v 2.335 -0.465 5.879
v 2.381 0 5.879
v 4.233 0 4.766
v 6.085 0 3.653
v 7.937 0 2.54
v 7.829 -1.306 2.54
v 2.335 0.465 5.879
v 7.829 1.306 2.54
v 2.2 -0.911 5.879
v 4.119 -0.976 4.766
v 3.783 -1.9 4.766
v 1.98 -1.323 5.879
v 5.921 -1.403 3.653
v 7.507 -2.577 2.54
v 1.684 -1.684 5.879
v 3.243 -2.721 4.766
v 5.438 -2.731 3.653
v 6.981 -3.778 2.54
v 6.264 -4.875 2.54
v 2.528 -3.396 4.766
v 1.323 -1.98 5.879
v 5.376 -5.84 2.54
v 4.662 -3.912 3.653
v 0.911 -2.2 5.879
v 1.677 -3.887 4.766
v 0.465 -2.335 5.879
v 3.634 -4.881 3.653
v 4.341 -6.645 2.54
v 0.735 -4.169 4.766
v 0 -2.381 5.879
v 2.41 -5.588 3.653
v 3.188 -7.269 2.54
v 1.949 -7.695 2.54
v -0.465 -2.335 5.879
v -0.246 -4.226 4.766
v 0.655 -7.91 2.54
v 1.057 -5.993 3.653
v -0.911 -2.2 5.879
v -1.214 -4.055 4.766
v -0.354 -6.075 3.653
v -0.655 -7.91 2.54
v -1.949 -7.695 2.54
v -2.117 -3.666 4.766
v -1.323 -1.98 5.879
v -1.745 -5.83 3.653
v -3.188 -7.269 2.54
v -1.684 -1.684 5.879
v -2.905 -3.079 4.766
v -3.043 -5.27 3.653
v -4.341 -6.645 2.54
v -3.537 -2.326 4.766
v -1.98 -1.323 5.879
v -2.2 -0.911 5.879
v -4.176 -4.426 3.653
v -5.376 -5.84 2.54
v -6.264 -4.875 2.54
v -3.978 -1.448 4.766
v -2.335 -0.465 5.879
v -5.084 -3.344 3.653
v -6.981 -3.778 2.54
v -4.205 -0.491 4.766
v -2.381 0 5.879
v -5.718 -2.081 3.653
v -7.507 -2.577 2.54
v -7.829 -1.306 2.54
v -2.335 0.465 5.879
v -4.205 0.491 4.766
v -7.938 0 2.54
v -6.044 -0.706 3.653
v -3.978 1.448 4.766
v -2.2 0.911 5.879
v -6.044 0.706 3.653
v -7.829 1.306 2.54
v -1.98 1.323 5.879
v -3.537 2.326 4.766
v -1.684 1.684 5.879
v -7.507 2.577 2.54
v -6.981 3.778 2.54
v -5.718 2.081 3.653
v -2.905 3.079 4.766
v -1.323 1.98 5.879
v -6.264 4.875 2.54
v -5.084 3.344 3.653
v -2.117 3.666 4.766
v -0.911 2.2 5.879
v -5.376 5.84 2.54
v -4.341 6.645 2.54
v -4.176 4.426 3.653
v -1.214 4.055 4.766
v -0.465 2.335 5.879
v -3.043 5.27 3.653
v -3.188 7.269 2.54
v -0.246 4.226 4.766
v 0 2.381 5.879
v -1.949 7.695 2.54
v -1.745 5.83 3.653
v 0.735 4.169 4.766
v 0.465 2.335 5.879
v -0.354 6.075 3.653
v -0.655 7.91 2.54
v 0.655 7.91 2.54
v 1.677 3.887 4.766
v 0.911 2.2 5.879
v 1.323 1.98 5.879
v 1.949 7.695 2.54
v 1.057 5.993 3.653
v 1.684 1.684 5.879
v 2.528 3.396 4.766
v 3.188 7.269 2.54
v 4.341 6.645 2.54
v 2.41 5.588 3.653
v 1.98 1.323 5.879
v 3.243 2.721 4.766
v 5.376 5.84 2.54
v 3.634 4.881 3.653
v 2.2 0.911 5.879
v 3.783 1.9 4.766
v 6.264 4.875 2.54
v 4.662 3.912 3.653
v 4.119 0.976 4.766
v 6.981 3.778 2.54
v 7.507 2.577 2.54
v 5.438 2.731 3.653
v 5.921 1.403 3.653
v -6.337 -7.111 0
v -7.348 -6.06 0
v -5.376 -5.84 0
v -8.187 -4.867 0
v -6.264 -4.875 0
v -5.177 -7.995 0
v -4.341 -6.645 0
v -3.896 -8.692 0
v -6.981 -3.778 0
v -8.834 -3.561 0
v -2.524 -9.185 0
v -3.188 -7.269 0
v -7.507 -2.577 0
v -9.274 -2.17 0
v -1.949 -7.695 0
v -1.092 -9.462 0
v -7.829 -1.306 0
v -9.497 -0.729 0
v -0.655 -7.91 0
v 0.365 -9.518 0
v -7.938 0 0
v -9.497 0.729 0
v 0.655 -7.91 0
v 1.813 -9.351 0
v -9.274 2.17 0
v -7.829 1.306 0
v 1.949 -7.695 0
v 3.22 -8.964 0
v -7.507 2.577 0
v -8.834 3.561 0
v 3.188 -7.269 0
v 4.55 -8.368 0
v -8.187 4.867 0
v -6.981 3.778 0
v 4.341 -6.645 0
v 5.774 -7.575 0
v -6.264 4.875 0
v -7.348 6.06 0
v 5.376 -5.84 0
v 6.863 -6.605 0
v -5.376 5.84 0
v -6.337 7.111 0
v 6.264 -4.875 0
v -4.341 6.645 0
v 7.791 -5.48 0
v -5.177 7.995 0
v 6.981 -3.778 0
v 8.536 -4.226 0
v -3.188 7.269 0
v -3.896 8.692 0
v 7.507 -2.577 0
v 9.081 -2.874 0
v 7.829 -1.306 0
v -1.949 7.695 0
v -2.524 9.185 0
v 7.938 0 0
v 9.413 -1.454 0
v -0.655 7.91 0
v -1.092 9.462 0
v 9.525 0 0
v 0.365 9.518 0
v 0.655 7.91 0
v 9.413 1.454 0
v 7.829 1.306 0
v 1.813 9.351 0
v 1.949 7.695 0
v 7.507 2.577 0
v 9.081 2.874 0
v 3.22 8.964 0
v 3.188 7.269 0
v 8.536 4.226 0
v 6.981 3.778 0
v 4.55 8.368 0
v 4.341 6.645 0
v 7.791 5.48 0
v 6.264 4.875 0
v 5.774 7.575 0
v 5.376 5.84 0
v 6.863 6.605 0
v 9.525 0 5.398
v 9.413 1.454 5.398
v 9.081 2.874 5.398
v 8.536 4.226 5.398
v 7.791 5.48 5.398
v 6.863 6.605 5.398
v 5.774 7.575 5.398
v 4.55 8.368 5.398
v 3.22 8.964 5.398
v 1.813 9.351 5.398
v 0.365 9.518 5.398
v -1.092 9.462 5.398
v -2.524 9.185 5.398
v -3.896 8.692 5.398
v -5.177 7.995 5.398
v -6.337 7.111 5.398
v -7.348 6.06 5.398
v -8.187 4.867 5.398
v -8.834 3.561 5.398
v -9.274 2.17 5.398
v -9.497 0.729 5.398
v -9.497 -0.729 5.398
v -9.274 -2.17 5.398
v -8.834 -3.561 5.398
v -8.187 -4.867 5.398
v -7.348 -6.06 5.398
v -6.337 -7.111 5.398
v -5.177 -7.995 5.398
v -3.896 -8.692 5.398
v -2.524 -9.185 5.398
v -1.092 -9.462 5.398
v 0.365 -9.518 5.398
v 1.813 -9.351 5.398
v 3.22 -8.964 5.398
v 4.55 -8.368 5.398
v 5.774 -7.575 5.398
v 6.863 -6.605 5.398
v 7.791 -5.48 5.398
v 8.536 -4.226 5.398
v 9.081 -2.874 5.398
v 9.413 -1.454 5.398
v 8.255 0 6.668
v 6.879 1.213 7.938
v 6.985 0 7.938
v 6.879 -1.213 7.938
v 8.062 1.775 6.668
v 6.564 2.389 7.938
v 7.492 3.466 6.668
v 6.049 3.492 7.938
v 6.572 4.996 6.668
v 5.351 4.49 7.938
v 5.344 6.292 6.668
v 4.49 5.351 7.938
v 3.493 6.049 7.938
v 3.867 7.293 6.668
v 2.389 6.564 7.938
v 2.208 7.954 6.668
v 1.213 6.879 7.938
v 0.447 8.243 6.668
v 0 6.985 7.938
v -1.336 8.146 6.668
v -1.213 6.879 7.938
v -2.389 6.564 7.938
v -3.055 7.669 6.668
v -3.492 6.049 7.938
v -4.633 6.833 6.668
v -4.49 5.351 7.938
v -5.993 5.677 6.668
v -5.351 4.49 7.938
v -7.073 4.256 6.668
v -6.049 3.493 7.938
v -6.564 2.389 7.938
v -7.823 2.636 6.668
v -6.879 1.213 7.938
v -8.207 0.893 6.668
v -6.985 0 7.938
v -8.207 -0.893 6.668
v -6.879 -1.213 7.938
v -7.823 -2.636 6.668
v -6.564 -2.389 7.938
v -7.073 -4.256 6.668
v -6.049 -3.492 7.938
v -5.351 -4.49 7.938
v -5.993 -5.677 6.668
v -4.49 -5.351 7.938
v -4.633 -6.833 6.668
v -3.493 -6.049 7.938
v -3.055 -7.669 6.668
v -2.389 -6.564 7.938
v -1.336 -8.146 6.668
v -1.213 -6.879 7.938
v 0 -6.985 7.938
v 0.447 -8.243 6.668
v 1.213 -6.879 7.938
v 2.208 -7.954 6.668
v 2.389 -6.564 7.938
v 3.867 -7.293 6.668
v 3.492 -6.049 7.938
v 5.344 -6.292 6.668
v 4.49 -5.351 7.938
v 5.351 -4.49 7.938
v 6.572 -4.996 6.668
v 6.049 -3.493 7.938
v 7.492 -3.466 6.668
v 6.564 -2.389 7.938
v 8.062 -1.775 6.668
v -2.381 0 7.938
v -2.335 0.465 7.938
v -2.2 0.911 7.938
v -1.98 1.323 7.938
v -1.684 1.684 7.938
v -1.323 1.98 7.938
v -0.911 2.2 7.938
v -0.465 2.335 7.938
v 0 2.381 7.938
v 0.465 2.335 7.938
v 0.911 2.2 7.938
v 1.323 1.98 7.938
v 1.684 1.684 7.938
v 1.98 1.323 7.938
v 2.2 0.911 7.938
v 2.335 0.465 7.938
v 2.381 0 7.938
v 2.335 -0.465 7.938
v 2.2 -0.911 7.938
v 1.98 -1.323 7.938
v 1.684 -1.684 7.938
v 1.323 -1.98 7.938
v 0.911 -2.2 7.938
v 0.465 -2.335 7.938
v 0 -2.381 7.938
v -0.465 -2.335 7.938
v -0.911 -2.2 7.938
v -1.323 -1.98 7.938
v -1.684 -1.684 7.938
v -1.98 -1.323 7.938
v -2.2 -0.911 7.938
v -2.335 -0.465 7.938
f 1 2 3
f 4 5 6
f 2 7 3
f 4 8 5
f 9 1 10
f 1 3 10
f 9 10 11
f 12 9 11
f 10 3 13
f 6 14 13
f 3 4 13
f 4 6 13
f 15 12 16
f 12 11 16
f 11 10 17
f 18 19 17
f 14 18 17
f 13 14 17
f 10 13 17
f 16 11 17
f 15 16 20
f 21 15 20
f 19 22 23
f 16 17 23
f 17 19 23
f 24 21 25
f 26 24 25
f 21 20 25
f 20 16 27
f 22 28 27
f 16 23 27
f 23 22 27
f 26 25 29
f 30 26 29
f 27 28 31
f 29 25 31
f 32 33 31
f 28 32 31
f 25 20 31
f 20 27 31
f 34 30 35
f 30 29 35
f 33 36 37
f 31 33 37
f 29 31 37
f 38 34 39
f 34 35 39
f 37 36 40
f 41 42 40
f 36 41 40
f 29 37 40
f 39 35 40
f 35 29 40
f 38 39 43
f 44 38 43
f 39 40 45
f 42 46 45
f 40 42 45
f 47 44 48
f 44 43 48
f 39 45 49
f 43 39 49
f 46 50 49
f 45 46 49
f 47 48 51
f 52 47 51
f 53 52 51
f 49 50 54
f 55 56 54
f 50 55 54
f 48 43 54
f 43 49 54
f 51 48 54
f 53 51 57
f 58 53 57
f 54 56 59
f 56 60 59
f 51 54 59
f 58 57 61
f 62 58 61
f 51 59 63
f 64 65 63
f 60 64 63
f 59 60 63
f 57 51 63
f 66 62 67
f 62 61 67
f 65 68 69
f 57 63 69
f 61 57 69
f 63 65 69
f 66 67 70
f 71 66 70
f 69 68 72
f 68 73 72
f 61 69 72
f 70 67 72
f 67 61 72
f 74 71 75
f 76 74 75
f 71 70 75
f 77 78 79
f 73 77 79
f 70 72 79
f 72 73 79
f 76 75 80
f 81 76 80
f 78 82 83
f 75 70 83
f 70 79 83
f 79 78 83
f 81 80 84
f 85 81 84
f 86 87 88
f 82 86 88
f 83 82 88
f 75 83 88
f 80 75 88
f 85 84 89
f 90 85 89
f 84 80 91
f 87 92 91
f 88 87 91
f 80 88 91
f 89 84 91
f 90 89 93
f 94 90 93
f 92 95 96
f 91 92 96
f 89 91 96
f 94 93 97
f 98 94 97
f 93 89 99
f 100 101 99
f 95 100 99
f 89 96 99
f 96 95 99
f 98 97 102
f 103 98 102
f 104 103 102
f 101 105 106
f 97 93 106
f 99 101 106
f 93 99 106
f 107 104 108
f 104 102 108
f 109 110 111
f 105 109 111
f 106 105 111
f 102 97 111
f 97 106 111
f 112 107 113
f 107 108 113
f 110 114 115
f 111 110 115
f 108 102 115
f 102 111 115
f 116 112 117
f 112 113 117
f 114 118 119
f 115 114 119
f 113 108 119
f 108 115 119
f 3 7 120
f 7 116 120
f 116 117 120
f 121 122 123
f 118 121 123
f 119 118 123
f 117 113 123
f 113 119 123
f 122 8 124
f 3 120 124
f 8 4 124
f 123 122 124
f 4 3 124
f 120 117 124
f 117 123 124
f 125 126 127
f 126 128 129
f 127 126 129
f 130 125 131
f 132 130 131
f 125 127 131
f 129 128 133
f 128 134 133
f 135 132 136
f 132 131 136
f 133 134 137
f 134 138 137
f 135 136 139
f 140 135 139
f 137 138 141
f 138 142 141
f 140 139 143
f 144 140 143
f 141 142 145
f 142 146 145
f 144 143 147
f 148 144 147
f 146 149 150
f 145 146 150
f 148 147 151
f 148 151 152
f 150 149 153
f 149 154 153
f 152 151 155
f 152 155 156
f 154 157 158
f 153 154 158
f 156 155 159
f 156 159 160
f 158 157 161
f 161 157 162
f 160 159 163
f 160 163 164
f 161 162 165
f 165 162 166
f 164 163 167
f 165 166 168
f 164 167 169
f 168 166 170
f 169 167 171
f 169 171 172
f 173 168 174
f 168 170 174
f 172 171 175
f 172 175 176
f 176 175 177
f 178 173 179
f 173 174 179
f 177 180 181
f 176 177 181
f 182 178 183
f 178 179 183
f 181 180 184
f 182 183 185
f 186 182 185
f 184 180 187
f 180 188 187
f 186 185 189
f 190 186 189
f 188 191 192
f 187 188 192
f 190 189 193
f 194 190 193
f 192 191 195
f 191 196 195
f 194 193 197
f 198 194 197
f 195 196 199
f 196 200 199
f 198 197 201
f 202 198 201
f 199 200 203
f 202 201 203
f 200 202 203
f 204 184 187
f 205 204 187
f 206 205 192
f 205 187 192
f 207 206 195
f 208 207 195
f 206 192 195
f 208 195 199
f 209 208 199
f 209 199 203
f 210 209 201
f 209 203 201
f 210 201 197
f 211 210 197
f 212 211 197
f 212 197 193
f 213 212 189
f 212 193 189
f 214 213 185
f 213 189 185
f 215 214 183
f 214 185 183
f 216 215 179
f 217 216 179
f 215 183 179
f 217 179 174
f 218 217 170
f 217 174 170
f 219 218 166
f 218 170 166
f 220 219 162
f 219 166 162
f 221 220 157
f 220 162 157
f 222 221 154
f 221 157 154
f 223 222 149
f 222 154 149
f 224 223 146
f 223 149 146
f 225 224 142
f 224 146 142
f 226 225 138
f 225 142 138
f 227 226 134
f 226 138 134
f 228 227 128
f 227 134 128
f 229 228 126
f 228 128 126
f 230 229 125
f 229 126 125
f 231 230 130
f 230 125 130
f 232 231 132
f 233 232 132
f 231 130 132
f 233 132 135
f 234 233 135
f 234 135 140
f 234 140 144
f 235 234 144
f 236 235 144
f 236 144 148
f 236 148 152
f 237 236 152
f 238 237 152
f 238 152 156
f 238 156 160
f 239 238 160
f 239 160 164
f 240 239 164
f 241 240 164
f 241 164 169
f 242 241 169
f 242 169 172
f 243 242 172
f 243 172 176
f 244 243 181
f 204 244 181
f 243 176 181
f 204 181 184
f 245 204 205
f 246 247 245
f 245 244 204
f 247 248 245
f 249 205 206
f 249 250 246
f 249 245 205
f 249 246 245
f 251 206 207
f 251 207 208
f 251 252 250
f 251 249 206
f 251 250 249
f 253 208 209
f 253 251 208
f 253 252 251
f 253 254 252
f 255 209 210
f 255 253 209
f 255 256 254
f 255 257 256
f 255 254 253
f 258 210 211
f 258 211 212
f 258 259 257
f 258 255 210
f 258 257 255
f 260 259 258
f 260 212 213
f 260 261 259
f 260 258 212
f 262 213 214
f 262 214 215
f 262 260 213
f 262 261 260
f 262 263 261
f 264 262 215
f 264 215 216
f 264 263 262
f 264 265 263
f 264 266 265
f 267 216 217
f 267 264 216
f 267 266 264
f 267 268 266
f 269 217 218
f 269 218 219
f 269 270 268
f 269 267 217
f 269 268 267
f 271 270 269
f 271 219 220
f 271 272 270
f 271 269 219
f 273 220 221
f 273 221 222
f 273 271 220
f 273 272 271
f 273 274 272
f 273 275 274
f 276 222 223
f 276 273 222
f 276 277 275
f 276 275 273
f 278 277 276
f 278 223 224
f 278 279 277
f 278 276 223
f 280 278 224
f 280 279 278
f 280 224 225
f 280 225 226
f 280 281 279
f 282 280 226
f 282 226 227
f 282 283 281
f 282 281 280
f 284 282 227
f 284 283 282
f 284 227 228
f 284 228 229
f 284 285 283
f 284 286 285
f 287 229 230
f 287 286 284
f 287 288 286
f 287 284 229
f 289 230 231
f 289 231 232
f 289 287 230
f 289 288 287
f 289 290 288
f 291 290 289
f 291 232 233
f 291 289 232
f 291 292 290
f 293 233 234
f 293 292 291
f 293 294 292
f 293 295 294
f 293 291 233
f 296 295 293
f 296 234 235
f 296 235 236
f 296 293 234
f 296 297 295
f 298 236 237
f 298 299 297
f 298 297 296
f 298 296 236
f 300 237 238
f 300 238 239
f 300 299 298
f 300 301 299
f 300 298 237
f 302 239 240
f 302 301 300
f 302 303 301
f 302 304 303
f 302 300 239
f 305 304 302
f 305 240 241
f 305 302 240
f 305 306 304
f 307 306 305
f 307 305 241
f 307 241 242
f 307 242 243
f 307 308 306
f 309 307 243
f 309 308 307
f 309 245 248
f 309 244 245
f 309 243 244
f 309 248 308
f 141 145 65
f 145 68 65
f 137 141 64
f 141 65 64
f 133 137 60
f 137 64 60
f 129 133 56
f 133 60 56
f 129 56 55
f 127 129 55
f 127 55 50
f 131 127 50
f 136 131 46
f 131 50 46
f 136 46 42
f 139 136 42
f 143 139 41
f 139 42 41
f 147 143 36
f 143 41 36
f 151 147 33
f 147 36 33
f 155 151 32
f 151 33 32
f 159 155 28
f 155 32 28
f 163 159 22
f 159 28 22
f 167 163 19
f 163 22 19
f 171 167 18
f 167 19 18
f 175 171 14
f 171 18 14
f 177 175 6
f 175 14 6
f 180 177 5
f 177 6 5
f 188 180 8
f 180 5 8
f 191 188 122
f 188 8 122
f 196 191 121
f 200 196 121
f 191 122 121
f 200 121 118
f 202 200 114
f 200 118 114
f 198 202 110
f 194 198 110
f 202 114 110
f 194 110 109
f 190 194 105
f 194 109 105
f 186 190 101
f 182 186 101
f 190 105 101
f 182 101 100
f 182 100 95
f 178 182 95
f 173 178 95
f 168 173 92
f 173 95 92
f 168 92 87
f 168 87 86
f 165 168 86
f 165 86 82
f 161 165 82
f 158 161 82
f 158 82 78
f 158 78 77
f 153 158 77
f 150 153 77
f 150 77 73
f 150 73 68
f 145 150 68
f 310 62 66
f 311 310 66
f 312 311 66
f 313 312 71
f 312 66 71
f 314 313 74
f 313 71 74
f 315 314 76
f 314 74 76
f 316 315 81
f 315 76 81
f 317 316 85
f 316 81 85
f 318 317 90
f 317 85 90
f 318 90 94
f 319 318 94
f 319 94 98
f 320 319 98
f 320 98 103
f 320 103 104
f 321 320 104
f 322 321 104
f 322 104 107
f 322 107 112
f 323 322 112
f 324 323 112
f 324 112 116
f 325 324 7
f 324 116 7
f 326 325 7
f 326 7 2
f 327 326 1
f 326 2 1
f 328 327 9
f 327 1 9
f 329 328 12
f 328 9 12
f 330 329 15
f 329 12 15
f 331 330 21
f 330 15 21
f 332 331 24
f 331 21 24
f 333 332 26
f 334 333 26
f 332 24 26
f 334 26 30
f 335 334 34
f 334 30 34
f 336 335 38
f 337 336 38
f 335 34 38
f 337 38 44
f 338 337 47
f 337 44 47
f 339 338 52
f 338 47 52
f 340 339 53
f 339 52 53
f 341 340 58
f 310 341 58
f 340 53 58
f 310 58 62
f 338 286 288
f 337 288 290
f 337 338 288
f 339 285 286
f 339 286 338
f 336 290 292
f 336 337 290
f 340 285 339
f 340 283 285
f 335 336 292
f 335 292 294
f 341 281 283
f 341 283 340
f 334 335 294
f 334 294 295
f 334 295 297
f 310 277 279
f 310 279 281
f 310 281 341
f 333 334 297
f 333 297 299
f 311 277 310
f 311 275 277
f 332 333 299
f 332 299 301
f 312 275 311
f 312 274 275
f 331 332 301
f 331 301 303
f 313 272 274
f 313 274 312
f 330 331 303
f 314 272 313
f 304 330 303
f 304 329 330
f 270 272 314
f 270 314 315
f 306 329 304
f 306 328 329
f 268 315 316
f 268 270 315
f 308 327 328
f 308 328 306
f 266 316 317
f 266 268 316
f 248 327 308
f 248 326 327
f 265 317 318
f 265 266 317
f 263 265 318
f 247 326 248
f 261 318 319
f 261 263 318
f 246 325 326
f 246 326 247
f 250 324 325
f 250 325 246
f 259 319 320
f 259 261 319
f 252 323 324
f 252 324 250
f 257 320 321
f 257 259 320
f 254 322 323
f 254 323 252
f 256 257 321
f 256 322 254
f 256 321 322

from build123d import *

# Parameters (mm, degrees)
F0_R     = 9.525
F1_DEPTH = 7.9375
F2_SIZE2 = 2.54
F2_SIZE  = 2.54
F4_D     = 4.7625
F6_D     = 15.875
F6_DEPTH = 2.54
F6_TIP   = 4.7693311635


with BuildPart() as f1:
    # F0 (on Top) → F1 (new body)
    with BuildSketch(Plane.XY):
        Circle(F0_R)
    extrude(amount=F1_DEPTH)

    # F2
    f2_edges = [f1.edges().sort_by_distance(p)[0] for p in [
        (-9.525, 0, 7.9375),
    ]]
    chamfer(f2_edges, length=F2_SIZE, length2=F2_SIZE2)

    # F4 (through all)
    with Locations(Plane.XY.offset(7.9375)):
        with Locations((0, 0)):
            Hole(F4_D / 2)

    # F6
    with Locations(Plane(origin=(0, 0, 0), x_dir=(1, 0, 0), z_dir=(0, 0, -1))):
        with Locations((0, 0)):
            Hole(F6_D / 2, depth=F6_DEPTH)
            with Locations((0, 0, -(F6_DEPTH + F6_TIP / 2))):  # 118° drill point
                Cone(0, F6_D / 2, F6_TIP, mode=Mode.SUBTRACT)


solid = f1.part
